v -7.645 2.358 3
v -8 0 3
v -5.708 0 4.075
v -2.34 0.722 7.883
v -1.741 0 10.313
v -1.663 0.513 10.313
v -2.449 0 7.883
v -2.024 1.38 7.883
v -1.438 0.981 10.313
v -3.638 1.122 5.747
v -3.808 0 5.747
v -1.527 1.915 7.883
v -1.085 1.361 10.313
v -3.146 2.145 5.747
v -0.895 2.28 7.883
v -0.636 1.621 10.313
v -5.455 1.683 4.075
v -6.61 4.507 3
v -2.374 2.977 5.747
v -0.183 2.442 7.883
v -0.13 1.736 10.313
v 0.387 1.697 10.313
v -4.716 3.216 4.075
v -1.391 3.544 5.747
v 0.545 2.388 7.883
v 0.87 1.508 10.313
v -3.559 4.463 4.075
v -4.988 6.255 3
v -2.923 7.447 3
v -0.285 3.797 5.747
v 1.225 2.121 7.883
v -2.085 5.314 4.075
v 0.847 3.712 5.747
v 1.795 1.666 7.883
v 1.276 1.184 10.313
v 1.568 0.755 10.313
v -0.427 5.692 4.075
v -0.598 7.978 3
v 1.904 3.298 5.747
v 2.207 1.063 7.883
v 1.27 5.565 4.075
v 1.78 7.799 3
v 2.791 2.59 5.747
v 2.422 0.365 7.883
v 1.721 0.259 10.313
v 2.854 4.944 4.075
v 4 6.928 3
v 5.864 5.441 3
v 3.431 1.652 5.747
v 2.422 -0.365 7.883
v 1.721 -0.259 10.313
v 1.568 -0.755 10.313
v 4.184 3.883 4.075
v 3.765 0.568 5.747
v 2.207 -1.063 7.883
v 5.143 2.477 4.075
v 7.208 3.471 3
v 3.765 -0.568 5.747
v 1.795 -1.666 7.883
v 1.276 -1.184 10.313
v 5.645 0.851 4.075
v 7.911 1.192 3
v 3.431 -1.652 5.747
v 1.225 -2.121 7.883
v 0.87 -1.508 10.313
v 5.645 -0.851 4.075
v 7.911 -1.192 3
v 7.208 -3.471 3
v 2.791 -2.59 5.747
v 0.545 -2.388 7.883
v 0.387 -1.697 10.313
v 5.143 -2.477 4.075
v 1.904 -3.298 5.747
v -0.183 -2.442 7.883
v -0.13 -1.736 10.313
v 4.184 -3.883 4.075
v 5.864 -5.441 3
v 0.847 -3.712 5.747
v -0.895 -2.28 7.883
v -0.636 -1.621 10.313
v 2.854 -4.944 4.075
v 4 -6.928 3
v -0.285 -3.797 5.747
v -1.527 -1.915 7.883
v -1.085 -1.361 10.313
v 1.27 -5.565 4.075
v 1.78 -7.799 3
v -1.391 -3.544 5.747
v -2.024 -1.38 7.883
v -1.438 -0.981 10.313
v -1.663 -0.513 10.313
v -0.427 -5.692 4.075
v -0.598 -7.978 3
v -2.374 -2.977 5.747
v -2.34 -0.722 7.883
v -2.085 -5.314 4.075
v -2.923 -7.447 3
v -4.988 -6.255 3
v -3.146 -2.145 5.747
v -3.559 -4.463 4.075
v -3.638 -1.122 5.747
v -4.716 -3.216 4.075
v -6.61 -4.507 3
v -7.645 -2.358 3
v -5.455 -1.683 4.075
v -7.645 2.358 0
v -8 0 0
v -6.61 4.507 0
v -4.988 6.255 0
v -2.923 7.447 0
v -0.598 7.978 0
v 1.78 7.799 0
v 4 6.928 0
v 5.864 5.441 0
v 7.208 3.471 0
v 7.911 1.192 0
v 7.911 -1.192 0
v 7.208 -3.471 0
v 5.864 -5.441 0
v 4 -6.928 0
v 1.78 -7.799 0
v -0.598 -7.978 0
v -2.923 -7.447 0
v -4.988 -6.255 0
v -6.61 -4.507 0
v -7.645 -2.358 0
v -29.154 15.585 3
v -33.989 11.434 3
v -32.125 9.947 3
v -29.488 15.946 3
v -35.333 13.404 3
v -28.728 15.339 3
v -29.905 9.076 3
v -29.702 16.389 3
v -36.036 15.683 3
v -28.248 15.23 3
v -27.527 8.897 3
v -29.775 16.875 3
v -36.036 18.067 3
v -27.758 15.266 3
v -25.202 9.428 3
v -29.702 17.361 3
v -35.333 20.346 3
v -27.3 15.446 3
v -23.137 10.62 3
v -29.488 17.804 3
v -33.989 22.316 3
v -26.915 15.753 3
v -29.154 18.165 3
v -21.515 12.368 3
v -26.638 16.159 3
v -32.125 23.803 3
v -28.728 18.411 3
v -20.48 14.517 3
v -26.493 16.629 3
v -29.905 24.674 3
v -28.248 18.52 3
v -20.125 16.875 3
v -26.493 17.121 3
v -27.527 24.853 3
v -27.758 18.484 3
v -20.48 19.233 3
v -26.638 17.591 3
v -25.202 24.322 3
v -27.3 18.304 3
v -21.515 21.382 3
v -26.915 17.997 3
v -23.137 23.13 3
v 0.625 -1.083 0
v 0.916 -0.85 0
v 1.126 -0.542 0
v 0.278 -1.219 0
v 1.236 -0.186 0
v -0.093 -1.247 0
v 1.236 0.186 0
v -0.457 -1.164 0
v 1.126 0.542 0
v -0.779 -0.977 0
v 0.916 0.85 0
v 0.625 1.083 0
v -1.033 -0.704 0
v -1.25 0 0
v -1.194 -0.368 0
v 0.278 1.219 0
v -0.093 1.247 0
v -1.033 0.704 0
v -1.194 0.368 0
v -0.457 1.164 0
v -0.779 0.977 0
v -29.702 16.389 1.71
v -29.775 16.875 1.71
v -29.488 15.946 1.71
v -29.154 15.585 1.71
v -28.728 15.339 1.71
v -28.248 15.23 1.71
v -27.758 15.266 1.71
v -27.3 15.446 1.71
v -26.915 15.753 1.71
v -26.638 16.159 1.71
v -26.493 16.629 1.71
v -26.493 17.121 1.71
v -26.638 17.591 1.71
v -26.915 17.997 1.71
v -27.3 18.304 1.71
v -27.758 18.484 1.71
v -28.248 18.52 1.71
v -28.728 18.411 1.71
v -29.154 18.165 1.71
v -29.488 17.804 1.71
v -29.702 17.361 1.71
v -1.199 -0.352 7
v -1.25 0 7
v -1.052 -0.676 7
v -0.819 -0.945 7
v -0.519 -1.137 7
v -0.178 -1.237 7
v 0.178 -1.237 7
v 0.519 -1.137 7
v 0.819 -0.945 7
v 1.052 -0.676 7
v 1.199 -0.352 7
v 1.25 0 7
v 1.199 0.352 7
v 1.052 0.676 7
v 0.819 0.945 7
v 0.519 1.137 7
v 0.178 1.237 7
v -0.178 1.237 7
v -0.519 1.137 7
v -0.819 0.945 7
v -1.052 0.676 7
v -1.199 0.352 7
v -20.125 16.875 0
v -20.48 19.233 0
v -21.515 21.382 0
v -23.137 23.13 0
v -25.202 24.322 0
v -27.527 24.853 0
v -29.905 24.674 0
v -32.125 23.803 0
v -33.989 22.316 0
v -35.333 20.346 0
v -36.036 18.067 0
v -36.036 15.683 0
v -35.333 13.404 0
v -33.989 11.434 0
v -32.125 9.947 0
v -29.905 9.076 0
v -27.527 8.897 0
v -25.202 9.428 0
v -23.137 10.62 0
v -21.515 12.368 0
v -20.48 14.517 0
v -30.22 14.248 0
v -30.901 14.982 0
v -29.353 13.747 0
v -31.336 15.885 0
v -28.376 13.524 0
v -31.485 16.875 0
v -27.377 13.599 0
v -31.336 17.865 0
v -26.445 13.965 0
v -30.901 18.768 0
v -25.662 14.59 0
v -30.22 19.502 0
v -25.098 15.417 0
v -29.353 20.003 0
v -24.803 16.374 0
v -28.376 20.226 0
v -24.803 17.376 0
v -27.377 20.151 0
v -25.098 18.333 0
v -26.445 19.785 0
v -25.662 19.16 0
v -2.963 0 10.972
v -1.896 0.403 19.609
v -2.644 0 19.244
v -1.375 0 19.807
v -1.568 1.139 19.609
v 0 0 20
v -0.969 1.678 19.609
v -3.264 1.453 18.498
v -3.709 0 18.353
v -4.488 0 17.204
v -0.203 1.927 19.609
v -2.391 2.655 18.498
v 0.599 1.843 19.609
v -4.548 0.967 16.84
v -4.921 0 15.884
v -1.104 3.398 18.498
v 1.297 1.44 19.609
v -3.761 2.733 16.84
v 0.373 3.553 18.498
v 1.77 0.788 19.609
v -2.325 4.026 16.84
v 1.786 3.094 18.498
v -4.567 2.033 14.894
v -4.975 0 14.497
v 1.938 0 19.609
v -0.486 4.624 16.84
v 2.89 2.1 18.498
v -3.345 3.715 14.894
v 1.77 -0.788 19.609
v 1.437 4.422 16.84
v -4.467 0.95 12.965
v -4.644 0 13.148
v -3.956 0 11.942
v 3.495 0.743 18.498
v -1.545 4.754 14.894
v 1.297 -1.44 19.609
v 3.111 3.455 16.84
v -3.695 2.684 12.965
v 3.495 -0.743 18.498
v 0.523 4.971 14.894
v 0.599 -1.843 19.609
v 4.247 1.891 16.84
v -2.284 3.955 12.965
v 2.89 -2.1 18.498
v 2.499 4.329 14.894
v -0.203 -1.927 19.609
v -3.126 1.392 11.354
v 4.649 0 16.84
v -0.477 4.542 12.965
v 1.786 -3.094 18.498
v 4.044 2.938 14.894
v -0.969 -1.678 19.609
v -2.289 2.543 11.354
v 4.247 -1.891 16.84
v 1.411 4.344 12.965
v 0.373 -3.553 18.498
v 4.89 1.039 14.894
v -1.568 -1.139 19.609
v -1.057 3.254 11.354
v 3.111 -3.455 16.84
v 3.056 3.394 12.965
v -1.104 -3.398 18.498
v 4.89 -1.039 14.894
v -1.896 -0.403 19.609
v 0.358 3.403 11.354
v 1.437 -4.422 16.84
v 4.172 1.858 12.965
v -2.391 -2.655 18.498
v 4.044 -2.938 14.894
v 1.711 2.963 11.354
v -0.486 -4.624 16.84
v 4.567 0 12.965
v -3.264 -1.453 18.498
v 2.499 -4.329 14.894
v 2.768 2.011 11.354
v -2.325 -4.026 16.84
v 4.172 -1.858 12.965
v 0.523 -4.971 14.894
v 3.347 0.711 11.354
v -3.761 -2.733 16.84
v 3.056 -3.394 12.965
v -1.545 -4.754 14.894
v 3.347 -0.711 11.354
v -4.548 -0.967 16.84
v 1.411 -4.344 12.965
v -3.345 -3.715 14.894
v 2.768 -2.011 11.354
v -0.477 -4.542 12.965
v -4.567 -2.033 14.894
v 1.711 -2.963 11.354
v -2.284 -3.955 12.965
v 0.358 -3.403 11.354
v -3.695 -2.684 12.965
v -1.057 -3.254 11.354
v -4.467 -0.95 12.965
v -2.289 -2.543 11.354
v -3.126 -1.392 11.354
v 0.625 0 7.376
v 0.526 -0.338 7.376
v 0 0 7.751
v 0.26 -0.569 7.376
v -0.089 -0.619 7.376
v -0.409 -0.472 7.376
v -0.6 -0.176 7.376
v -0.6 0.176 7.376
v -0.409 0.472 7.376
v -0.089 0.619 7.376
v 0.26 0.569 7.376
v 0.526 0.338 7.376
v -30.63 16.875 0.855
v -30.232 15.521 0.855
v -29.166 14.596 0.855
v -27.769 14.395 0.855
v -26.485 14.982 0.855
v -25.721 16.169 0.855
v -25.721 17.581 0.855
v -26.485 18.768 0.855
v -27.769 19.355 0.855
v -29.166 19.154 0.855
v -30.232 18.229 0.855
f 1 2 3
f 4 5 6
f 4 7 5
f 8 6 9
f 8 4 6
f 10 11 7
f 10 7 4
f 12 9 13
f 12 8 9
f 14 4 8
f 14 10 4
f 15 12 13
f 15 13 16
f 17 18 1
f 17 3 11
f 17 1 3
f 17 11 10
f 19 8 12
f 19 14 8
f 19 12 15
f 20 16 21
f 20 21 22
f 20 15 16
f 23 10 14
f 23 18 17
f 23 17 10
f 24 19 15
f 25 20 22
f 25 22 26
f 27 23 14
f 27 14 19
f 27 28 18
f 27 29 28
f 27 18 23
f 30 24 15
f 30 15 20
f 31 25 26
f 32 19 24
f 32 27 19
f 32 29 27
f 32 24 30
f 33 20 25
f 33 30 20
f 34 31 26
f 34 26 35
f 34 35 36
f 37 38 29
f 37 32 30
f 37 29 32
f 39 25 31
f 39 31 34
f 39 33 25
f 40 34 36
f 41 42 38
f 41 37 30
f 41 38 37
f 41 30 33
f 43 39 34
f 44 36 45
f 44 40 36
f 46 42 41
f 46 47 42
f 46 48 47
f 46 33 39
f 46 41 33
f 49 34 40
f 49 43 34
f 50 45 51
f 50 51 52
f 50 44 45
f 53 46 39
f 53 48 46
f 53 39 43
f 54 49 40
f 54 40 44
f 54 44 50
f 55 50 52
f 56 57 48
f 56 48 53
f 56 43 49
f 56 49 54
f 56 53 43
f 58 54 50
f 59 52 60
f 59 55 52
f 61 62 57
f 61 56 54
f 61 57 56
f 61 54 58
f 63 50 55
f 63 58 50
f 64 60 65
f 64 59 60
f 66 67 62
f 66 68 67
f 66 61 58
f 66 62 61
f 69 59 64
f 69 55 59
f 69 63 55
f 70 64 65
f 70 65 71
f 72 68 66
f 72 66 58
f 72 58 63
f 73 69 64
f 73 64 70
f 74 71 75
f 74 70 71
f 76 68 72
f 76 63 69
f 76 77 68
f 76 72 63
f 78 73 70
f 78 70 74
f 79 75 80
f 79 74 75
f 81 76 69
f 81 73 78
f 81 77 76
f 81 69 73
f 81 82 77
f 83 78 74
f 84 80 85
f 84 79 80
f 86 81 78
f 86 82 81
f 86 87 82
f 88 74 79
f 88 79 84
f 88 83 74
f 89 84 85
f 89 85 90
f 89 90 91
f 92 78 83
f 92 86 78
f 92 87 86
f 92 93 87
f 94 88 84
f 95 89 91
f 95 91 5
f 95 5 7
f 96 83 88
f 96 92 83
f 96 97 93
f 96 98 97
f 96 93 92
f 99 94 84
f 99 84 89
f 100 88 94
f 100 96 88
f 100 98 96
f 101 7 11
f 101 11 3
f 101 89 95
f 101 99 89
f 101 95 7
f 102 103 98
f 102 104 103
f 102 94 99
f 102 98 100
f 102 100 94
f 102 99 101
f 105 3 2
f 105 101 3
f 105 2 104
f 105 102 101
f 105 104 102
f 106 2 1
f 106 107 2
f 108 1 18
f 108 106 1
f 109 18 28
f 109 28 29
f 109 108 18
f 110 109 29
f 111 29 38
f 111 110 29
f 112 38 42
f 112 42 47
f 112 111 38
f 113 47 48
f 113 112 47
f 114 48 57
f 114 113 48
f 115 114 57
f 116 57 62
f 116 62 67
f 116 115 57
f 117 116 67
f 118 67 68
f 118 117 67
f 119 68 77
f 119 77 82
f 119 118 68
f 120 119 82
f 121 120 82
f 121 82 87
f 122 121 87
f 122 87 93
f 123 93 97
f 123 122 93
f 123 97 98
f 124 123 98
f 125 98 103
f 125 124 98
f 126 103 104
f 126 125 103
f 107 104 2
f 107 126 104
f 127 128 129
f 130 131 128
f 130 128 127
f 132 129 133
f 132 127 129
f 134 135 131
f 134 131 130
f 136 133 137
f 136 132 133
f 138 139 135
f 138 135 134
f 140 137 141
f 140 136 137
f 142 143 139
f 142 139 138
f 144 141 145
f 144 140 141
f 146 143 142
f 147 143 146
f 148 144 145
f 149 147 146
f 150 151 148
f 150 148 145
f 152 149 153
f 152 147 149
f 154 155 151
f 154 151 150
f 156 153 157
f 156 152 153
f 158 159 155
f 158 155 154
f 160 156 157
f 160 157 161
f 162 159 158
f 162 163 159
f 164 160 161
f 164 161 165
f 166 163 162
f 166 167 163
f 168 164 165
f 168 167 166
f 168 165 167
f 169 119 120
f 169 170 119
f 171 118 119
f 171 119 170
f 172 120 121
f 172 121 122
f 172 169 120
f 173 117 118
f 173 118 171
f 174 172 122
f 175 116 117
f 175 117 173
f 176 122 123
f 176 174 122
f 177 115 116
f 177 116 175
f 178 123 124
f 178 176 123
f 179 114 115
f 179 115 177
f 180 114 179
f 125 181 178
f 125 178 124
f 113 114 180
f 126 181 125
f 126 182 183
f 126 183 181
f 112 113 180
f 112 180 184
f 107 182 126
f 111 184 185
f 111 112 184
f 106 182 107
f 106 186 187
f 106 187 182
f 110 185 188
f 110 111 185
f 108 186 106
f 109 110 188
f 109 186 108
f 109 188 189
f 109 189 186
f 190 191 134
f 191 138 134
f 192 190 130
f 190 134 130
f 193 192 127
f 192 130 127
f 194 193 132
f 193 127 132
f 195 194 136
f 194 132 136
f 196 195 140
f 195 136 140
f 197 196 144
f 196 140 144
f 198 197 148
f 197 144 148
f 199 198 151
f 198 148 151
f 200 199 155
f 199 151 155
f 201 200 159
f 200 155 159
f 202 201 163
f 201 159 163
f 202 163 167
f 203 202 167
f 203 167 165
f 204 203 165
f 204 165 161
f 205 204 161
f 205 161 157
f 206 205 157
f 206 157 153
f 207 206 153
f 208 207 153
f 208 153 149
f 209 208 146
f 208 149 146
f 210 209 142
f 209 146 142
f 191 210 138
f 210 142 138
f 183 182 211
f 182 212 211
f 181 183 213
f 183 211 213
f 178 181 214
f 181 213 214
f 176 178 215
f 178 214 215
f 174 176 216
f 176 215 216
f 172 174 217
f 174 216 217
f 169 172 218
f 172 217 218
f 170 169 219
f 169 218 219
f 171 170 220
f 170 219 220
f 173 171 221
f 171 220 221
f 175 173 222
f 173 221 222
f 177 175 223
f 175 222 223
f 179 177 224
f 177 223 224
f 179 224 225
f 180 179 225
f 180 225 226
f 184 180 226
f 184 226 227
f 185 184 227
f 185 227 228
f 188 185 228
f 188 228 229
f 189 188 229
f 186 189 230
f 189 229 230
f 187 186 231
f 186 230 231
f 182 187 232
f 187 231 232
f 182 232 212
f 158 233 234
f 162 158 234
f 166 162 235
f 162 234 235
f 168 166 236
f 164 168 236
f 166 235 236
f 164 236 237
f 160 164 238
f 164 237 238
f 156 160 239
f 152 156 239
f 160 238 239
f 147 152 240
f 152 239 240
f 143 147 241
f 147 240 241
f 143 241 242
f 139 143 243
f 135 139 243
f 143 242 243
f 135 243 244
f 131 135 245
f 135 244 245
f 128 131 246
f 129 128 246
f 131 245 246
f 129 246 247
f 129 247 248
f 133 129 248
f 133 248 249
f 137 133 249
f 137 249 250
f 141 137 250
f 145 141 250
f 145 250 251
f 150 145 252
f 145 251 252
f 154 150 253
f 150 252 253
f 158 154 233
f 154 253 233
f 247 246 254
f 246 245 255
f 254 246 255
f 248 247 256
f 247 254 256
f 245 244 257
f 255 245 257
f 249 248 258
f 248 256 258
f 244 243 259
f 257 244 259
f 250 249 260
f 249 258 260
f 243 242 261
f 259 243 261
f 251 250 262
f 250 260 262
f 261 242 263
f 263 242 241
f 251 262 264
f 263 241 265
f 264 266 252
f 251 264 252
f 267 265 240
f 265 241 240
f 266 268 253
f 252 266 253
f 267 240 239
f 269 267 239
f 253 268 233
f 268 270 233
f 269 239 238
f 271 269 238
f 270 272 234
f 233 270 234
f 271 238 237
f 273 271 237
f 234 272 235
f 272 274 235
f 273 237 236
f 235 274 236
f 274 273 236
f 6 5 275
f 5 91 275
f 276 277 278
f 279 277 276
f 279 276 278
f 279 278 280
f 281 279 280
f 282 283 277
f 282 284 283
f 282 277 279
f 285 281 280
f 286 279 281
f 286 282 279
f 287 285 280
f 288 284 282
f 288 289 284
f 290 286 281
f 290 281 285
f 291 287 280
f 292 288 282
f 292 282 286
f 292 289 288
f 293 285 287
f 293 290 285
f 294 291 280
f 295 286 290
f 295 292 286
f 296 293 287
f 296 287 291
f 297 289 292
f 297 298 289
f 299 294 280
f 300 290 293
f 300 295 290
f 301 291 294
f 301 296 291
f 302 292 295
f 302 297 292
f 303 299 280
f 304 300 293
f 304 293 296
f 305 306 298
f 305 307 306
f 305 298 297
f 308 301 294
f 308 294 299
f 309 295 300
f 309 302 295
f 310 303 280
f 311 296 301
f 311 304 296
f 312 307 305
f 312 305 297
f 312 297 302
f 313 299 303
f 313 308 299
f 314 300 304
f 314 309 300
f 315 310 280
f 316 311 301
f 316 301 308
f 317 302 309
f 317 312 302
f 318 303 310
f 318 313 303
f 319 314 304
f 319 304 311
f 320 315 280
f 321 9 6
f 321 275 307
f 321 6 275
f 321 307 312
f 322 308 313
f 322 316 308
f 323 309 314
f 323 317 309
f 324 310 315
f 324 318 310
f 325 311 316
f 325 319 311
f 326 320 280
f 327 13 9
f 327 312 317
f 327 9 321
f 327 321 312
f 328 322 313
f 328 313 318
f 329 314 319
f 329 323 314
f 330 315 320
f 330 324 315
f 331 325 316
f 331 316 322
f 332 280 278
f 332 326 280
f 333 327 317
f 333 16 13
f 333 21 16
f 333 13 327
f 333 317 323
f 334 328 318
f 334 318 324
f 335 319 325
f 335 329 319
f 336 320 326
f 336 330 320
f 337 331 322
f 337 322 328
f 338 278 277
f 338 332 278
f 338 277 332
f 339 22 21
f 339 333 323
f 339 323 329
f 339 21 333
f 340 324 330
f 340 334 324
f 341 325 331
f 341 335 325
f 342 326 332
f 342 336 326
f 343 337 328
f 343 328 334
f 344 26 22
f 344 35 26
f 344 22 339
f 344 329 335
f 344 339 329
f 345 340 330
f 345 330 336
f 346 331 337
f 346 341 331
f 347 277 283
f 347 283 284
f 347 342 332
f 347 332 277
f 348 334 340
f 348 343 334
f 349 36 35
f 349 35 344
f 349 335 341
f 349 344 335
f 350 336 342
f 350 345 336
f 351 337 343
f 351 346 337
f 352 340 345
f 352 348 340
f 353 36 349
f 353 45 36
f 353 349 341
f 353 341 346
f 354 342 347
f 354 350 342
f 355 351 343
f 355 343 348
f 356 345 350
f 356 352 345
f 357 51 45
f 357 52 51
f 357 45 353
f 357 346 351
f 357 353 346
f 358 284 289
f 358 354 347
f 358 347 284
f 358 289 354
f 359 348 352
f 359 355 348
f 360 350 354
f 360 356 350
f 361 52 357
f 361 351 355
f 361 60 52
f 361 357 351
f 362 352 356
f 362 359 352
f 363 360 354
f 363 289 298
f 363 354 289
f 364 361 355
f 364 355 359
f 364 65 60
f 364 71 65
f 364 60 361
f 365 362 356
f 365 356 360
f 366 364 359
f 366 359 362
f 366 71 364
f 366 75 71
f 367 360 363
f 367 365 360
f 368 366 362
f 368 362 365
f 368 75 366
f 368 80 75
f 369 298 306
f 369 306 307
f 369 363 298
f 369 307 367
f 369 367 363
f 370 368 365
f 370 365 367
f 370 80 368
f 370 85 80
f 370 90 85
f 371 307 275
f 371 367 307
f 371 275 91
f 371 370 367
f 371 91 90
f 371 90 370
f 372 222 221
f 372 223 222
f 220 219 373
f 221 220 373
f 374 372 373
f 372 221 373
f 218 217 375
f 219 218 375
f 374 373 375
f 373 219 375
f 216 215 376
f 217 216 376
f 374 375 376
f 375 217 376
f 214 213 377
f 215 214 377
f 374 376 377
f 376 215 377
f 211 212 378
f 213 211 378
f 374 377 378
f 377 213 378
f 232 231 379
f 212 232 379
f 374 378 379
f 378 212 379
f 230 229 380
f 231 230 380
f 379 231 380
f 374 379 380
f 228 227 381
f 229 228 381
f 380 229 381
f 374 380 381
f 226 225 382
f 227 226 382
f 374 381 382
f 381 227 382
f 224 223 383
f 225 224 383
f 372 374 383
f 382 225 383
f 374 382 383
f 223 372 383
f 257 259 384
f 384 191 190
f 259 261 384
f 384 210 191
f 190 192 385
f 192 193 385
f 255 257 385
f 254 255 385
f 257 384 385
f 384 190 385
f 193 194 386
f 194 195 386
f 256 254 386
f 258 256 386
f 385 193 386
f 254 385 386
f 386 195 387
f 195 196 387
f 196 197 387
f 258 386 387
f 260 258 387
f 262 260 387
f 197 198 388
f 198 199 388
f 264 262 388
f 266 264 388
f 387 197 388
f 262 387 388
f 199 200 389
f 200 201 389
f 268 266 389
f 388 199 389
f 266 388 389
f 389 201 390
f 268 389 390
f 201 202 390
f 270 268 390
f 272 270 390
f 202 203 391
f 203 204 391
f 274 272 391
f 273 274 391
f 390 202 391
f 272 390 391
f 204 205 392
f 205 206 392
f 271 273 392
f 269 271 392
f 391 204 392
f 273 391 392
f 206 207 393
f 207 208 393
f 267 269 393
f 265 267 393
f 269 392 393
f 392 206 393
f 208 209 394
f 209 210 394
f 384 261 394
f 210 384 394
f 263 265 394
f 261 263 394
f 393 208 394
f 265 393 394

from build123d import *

# Parameters (mm, degrees)
F3_D           = 2.5
F3_DEPTH       = 7
F3_TIP         = 0.7510757738
F4_R           = 8
F5_DEPTH       = 3
F6_D           = 3.3
F6_DEPTH       = 7
F6_CSINK_D     = 6.72
F6_CSINK_ANGLE = 90
F6_TIP         = 0.9914200214


with BuildPart() as f1:
    # F0 (on Front) → F1 (revolve)
    with BuildSketch(Plane.XZ):
        with BuildLine():
            Line((-8, 0), (0, 0))
            Line((0, 0), (0, 20))
            ThreePointArc((0, 20), (-4.9211688735, 15.8843624363), (-1.7408387578, 10.3128387675))
            ThreePointArc((-1.7408387578, 10.3128387675), (-3.8076524747, 5.7467822882), (-8, 3))
            Line((-8, 3), (-8, 0))
        make_face()
    revolve(axis=Axis((0, 0, 10), (0, 0, -1)))

    # F3
    with Locations(Plane(origin=(0, 0, 0), x_dir=(1, 0, 0), z_dir=(0, 0, -1))):
        with Locations((0, 0)):
            Hole(F3_D / 2, depth=F3_DEPTH)
            with Locations((0, 0, -(F3_DEPTH + F3_TIP / 2))):  # 118° drill point
                Cone(0, F3_D / 2, F3_TIP, mode=Mode.SUBTRACT)


with BuildPart() as f5:
    # F4 (on Top) → F5 (new body)
    with BuildSketch(Plane.XY):
        with Locations((-28.1250011176, 16.8750006706)):
            Circle(F4_R)
    extrude(amount=F5_DEPTH)

    # F6
    with Locations(Plane(origin=(0, 0, 0), x_dir=(1, 0, 0), z_dir=(0, 0, -1))):
        with Locations((-28.1250011176, -16.8750006706)):
            CounterSinkHole(F6_D / 2, F6_CSINK_D / 2, depth=F6_DEPTH, counter_sink_angle=F6_CSINK_ANGLE)
            with Locations((0, 0, -(F6_DEPTH + F6_TIP / 2))):  # 118° drill point
                Cone(0, F6_D / 2, F6_TIP, mode=Mode.SUBTRACT)


solid = Compound([f1.part, f5.part])
